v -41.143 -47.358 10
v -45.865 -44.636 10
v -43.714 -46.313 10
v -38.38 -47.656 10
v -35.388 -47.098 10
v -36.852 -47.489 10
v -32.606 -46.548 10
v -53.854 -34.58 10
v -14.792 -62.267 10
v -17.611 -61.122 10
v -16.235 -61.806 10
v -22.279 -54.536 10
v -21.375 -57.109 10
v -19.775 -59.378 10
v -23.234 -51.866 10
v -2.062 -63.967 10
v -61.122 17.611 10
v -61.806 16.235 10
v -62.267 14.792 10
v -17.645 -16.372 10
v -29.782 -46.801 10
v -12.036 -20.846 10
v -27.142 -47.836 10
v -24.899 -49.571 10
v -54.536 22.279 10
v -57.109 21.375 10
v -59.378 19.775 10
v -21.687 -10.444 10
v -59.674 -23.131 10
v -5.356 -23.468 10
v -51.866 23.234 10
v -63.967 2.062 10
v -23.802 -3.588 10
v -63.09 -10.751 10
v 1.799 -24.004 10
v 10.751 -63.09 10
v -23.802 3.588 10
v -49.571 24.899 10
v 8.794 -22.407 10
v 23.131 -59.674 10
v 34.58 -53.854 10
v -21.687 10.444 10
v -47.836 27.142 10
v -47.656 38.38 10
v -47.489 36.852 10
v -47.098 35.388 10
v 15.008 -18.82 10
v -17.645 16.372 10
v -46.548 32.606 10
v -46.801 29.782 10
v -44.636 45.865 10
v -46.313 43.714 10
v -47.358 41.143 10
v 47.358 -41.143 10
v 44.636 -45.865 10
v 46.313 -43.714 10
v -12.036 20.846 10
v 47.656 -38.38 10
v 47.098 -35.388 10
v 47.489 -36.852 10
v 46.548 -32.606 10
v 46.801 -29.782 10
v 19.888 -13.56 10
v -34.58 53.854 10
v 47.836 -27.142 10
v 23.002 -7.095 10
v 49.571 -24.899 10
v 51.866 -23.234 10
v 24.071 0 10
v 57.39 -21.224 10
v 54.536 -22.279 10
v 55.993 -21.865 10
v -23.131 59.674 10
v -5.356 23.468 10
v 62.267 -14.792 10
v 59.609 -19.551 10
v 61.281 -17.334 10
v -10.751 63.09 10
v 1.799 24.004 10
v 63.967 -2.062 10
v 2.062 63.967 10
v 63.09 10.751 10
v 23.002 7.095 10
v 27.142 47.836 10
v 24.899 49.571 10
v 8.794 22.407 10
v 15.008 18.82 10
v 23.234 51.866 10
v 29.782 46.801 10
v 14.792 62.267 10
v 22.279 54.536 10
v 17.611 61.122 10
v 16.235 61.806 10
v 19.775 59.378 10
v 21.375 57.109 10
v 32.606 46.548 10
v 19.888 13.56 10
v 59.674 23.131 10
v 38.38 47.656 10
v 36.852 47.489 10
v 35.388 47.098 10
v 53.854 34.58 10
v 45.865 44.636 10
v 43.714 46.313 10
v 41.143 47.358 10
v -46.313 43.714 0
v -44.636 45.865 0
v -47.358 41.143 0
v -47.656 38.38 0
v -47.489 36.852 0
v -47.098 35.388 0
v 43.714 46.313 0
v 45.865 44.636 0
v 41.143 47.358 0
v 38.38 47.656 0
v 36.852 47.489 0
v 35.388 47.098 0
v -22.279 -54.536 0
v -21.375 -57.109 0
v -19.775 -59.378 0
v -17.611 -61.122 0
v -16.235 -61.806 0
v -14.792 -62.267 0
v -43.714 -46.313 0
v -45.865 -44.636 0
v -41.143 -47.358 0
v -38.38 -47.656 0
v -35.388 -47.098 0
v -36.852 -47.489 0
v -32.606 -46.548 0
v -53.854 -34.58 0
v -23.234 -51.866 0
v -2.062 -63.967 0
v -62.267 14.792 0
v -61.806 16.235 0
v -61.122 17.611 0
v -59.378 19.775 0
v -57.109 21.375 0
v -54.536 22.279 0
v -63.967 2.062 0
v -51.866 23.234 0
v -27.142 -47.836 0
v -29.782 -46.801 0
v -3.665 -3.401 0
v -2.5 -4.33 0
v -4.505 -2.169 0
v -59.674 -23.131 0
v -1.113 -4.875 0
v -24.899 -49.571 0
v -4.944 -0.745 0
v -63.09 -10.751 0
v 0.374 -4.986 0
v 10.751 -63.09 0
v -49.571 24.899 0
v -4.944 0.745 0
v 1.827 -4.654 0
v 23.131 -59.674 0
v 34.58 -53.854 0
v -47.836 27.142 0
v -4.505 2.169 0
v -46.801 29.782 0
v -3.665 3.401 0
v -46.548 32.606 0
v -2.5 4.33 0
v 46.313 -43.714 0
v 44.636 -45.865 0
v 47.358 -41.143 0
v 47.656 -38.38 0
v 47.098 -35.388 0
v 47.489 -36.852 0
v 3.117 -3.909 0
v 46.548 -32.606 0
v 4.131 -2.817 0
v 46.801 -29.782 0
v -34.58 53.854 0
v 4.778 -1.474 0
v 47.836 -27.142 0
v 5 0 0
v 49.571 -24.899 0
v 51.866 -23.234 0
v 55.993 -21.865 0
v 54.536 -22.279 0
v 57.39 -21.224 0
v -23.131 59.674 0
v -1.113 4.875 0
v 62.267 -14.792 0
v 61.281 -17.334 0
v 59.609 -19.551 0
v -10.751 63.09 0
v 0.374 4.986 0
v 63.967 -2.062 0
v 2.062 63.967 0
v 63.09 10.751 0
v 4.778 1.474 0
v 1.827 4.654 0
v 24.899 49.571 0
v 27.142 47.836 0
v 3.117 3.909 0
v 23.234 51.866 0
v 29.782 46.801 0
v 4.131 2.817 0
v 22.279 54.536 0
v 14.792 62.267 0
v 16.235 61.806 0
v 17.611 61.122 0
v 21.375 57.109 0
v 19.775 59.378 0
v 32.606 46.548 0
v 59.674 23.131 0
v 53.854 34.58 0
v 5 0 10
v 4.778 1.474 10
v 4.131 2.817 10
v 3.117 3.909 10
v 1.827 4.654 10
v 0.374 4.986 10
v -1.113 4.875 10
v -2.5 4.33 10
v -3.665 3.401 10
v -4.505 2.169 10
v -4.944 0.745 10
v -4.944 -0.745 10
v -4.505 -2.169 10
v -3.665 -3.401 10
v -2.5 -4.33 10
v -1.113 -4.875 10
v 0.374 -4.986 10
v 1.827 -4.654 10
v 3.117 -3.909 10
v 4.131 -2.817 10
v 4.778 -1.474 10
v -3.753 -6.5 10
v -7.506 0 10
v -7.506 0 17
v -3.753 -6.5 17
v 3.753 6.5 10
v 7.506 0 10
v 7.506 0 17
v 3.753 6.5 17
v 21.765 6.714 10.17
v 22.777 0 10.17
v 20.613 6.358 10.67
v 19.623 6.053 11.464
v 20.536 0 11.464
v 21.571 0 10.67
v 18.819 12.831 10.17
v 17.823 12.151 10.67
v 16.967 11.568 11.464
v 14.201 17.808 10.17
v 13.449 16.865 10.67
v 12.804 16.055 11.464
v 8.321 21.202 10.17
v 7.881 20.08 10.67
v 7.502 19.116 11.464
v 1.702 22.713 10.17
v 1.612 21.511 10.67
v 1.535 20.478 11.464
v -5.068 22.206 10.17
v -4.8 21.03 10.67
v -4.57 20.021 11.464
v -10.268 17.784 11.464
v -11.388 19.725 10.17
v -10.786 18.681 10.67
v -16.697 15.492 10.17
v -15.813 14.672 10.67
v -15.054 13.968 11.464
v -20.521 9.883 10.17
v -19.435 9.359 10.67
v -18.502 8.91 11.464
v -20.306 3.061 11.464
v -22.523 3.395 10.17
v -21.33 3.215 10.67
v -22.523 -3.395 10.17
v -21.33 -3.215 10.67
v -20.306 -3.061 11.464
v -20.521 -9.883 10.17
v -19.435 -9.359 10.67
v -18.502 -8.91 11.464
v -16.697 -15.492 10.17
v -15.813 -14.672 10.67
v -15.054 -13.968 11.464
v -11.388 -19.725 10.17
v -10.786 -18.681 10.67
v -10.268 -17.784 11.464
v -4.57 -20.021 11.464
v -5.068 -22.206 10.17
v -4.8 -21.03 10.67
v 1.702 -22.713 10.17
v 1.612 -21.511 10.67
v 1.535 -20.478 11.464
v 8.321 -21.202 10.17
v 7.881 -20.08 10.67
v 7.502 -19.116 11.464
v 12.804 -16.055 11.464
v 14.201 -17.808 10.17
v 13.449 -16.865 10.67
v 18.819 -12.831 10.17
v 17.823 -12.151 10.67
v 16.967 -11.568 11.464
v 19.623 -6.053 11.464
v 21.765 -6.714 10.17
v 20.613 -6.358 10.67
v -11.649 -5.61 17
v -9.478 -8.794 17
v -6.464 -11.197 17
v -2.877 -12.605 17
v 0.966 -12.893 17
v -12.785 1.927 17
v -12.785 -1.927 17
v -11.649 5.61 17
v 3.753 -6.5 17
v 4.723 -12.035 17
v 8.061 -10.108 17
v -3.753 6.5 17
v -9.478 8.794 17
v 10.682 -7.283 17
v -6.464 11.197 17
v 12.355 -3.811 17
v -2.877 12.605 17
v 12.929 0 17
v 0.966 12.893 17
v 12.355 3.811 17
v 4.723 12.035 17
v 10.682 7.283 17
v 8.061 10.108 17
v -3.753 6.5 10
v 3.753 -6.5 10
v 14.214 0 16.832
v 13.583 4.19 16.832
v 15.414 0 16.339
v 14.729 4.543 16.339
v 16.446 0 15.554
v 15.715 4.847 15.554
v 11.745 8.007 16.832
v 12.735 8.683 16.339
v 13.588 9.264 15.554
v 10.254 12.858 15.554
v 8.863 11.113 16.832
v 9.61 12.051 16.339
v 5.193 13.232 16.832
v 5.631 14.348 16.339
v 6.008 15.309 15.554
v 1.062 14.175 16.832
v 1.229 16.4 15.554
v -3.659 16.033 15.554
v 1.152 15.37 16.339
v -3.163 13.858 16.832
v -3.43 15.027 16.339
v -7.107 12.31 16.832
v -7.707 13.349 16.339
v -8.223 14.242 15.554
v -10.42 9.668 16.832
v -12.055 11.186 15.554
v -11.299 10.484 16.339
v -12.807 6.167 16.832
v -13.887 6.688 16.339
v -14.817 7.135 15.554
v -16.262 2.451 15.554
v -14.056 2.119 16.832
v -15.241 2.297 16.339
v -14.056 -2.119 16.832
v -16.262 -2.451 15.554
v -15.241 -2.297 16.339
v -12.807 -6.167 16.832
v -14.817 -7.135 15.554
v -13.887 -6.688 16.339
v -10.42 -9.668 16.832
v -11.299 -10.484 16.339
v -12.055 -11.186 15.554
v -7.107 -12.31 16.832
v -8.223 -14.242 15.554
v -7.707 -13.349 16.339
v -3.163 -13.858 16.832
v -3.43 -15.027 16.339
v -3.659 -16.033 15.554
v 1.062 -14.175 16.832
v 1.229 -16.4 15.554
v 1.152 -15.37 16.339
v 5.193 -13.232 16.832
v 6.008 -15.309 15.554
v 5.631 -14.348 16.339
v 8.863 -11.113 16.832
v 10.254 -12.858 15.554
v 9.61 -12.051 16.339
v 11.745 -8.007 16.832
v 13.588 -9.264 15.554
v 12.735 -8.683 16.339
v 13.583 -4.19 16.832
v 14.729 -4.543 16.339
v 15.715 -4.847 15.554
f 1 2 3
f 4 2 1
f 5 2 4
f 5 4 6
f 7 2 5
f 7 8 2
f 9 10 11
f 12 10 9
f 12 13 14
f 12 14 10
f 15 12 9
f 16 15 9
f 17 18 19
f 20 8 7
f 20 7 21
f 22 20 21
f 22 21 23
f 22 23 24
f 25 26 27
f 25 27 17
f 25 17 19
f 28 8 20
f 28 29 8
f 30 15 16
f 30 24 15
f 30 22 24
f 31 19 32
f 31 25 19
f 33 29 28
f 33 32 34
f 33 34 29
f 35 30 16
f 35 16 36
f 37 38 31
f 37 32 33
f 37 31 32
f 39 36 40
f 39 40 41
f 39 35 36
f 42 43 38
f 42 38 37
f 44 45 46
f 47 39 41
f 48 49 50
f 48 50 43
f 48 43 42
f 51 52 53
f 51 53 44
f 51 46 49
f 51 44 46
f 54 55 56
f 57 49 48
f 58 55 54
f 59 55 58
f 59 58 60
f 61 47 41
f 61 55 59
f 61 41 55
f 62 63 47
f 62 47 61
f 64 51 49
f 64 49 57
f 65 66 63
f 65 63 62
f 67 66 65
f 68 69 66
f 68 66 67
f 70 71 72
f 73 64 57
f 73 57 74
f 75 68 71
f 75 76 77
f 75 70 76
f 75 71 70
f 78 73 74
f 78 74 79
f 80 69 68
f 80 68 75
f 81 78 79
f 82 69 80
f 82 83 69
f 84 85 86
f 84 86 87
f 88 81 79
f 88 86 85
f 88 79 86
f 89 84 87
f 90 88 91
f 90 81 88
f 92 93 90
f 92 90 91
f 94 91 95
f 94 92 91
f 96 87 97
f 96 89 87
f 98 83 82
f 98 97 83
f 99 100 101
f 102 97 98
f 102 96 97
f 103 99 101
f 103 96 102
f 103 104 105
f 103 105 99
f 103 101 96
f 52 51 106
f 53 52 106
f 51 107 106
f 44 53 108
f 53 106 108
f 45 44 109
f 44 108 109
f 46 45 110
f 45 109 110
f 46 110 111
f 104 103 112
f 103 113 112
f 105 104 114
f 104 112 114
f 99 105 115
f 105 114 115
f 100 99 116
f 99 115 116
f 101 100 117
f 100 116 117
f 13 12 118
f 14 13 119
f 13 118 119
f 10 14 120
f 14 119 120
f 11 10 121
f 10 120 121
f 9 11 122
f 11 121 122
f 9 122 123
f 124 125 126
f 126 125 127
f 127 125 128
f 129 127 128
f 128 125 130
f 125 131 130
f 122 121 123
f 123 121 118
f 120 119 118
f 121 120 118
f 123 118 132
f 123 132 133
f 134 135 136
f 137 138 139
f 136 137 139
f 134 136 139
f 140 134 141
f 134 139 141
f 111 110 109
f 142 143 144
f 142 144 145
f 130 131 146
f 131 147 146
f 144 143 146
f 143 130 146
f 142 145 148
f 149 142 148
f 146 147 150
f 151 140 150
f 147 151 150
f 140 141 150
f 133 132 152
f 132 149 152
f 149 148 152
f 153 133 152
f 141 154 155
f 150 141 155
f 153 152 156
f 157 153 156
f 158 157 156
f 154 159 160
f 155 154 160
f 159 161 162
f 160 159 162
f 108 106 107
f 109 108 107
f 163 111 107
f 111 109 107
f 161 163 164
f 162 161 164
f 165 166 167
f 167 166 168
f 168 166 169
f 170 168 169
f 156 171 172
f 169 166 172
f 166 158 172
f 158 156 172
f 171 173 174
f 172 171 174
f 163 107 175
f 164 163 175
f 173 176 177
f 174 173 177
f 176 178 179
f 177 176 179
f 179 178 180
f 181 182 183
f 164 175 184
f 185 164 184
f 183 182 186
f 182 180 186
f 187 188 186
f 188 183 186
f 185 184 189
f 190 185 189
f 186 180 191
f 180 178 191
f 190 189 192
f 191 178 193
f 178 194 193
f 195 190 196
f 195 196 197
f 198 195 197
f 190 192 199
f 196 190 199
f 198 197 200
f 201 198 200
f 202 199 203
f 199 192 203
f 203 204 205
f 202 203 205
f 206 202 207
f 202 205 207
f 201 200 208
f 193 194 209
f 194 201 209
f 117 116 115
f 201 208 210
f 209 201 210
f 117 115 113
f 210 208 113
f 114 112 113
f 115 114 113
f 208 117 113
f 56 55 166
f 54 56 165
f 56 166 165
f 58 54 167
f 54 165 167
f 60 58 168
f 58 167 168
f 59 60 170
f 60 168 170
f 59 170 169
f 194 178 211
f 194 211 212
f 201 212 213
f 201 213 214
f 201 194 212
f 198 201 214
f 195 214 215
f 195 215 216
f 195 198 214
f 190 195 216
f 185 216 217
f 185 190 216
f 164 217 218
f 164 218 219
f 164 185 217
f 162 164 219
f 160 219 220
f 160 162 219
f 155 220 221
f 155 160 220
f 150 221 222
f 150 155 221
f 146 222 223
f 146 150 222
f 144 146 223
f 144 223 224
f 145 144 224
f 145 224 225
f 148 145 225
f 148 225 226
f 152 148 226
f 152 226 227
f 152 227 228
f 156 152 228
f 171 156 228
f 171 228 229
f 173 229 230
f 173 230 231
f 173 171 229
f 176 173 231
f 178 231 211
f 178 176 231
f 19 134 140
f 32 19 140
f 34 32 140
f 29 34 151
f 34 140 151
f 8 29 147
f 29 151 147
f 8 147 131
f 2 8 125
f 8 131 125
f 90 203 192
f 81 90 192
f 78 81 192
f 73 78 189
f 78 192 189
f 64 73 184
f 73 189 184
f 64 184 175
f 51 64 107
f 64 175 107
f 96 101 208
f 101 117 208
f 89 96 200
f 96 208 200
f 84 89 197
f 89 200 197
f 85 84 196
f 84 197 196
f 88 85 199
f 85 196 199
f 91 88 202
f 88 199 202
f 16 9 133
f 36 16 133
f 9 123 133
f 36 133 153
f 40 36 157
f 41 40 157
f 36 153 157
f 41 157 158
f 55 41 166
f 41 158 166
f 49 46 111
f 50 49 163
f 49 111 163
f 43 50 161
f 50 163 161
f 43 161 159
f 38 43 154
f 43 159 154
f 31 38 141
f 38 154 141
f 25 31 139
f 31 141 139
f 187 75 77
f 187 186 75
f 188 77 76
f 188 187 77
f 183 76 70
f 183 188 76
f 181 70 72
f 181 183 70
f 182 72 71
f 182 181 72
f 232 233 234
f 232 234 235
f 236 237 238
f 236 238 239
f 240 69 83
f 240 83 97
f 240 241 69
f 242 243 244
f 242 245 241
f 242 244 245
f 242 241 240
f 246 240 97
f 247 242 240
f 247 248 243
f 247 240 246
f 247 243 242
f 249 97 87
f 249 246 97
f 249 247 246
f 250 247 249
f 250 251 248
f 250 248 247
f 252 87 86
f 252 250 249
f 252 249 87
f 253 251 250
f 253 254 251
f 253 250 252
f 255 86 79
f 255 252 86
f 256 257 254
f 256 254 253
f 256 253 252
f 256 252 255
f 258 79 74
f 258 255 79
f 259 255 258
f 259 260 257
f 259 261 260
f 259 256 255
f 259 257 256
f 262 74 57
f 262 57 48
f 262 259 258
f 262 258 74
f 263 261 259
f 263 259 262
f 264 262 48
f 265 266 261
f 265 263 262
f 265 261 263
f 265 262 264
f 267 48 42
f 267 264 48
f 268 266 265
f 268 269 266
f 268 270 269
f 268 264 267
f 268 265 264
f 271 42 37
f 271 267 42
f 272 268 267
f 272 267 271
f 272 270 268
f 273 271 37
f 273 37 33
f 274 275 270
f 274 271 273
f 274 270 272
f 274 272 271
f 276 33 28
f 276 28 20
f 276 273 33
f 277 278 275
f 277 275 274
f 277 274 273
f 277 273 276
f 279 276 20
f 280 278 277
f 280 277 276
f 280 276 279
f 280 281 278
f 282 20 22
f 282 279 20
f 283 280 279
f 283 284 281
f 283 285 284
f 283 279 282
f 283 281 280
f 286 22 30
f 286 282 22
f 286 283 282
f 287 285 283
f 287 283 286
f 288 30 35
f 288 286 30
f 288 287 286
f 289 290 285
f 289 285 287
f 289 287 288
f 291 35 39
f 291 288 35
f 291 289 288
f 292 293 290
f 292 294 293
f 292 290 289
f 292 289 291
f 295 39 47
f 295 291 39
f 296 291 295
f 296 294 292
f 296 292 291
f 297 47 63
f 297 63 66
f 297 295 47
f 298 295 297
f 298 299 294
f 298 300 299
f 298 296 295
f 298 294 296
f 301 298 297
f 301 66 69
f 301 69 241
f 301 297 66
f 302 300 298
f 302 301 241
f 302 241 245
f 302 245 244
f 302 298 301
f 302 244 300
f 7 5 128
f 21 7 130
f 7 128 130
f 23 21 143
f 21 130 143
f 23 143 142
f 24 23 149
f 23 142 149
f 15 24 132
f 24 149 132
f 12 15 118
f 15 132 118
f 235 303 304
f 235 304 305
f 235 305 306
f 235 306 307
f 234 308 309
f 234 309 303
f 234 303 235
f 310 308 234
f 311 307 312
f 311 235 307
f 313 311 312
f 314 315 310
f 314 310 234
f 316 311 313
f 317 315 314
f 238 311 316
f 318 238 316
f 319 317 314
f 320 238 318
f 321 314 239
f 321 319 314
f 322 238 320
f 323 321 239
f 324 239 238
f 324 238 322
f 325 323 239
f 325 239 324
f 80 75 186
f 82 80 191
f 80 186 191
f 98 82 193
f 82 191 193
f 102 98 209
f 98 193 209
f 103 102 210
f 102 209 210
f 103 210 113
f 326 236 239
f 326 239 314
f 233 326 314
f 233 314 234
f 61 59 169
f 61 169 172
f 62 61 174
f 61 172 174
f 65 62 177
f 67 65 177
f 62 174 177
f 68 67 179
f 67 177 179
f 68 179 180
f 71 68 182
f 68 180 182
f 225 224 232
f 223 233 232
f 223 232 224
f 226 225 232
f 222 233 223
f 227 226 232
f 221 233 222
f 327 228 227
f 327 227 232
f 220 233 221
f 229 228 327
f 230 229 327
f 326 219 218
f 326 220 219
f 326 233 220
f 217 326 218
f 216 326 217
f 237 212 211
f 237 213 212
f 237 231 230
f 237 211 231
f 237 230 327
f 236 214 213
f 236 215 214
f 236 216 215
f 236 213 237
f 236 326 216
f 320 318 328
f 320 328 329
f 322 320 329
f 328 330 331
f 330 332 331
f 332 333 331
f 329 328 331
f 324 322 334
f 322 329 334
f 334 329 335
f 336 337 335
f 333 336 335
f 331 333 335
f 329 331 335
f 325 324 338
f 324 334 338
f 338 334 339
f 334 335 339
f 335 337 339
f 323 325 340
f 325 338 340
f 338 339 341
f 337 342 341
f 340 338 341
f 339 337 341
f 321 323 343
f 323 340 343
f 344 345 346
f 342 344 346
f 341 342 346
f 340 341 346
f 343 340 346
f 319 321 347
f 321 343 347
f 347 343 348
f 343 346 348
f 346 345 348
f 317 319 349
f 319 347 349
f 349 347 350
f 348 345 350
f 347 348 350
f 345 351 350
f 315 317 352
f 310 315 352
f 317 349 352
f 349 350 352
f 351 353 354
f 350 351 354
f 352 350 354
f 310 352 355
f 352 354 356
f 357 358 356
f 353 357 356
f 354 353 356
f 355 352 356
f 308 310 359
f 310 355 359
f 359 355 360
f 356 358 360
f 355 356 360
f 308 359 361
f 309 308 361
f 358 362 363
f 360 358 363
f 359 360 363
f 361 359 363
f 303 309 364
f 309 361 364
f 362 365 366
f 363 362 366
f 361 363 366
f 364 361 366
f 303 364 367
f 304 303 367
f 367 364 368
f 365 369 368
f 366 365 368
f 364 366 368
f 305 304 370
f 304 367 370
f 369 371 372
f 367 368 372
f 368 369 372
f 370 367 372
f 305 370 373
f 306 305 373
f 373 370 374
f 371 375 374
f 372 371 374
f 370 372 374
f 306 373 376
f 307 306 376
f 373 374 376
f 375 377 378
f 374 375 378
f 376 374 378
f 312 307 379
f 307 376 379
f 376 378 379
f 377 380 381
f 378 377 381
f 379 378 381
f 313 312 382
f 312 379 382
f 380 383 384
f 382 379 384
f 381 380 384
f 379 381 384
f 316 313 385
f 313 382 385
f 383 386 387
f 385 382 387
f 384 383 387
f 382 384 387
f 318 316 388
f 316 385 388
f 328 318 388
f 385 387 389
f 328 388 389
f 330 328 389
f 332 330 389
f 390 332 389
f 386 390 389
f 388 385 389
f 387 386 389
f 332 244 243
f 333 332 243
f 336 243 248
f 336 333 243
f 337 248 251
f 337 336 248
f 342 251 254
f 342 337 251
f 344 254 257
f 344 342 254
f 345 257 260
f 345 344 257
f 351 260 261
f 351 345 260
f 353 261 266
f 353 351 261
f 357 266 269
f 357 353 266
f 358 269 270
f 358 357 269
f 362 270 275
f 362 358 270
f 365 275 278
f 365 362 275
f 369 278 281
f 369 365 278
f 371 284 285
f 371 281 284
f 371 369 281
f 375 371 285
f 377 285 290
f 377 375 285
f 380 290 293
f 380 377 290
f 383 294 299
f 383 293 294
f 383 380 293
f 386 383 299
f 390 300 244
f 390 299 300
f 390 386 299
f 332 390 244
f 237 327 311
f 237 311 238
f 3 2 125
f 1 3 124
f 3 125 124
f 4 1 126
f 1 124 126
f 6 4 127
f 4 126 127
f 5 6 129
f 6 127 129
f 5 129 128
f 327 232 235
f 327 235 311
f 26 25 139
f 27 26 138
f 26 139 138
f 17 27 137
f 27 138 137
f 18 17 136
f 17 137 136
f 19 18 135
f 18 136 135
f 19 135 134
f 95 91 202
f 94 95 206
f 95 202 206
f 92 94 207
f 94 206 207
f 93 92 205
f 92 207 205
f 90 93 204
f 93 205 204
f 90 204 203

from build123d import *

# Parameters (mm, degrees)
SKETCH1_R           = 64
SKETCH1_R_2         = 5
BOSS_EXTRUDE1_DEPTH = 10
SKETCH2_R           = 15
BOSS_EXTRUDE2_DEPTH = 7
SKETCH3_R           = 10
CUT_EXTRUDE1_DEPTH  = 10
FILLET1_R           = 10
CHAMFER1_SIZE       = 7


with BuildPart() as part:
    # Sketch1 → Boss-Extrude1 (new body)
    with BuildSketch(Plane.XY):
        Circle(SKETCH1_R)
        Circle(SKETCH1_R_2, mode=Mode.SUBTRACT)
    extrude(amount=BOSS_EXTRUDE1_DEPTH)

    # Sketch2 → Boss-Extrude2 (add)
    with BuildSketch(Plane.XY.offset(10)):
        Circle(SKETCH2_R)
        Polygon((7.505553499, 0), (3.75277675, 6.5), (-3.75277675, 6.5), (-7.505553499, 0), (-3.75277675, -6.5), (3.75277675, -6.5), align=None, mode=Mode.SUBTRACT)
    extrude(amount=BOSS_EXTRUDE2_DEPTH)

    # Sketch3 → Cut-Extrude1 (cut)
    with BuildSketch(Plane(origin=(0, 0, 0), x_dir=(-1, 0, 0), z_dir=(0, 0, -1))):
        with Locations((56.533626817, 32.077235525)):
            Circle(SKETCH3_R)
        with Locations((32.077235525, -56.533626817)):
            Circle(SKETCH3_R)
        with Locations((-56.533626817, -32.077235525)):
            Circle(SKETCH3_R)
        with Locations((-32.077235525, 56.533626817)):
            Circle(SKETCH3_R)
    extrude(amount=-CUT_EXTRUDE1_DEPTH, mode=Mode.SUBTRACT)

    # Fillet1
    fillet1_edges = [part.edges().sort_by_distance(p)[0] for p in [
        (22.646447987, 59.859321693, 5),
        (39.769398937, 50.143742463, 5),
        (59.859321693, -22.646447987, 5),
        (50.143742463, -39.769398937, 5),
        (-22.646447987, -59.859321693, 5),
        (-39.769398937, -50.143742463, 5),
        (-59.859321693, 22.646447987, 5),
        (-50.143742463, 39.769398937, 5),
    ]]
    fillet(fillet1_edges, radius=FILLET1_R)

    # Chamfer1
    chamfer1_edges = [part.edges().sort_by_distance(p)[0] for p in [
        (-15, 0, 10),
    ]]
    chamfer(chamfer1_edges, length=CHAMFER1_SIZE - 0.0001)  # a hair under: the kernel refuses the full size

    # Fillet2: read off the stored shape, not the designer's step
    # Fillet2 outline → Fillet2 (revolve, cut)
    with BuildSketch(Plane.XZ):
        with BuildLine():
            ThreePointArc((12.928932188, 17), (14.84234935, 16.619397663), (16.464466094, 15.535533906))
            Line((16.464466094, 15.535533906), (16.464466094, 17))
            Line((16.464466094, 17), (12.928932188, 17))
        make_face()
    revolve(axis=Axis((0, 0, 0), (0, 0, 1)), mode=Mode.SUBTRACT)

    # Fillet2 2 outline → Fillet2 2 (revolve)
    with BuildSketch(Plane.XZ):
        with BuildLine():
            ThreePointArc((24.071067812, 10), (22.15765065, 10.380602337), (20.535533906, 11.464466094))
            Line((20.535533906, 11.464466094), (20.535533906, 10))
            Line((20.535533906, 10), (24.071067812, 10))
        make_face()
    revolve(axis=Axis((0, 0, 0), (0, 0, 1)))


solid = part.part
